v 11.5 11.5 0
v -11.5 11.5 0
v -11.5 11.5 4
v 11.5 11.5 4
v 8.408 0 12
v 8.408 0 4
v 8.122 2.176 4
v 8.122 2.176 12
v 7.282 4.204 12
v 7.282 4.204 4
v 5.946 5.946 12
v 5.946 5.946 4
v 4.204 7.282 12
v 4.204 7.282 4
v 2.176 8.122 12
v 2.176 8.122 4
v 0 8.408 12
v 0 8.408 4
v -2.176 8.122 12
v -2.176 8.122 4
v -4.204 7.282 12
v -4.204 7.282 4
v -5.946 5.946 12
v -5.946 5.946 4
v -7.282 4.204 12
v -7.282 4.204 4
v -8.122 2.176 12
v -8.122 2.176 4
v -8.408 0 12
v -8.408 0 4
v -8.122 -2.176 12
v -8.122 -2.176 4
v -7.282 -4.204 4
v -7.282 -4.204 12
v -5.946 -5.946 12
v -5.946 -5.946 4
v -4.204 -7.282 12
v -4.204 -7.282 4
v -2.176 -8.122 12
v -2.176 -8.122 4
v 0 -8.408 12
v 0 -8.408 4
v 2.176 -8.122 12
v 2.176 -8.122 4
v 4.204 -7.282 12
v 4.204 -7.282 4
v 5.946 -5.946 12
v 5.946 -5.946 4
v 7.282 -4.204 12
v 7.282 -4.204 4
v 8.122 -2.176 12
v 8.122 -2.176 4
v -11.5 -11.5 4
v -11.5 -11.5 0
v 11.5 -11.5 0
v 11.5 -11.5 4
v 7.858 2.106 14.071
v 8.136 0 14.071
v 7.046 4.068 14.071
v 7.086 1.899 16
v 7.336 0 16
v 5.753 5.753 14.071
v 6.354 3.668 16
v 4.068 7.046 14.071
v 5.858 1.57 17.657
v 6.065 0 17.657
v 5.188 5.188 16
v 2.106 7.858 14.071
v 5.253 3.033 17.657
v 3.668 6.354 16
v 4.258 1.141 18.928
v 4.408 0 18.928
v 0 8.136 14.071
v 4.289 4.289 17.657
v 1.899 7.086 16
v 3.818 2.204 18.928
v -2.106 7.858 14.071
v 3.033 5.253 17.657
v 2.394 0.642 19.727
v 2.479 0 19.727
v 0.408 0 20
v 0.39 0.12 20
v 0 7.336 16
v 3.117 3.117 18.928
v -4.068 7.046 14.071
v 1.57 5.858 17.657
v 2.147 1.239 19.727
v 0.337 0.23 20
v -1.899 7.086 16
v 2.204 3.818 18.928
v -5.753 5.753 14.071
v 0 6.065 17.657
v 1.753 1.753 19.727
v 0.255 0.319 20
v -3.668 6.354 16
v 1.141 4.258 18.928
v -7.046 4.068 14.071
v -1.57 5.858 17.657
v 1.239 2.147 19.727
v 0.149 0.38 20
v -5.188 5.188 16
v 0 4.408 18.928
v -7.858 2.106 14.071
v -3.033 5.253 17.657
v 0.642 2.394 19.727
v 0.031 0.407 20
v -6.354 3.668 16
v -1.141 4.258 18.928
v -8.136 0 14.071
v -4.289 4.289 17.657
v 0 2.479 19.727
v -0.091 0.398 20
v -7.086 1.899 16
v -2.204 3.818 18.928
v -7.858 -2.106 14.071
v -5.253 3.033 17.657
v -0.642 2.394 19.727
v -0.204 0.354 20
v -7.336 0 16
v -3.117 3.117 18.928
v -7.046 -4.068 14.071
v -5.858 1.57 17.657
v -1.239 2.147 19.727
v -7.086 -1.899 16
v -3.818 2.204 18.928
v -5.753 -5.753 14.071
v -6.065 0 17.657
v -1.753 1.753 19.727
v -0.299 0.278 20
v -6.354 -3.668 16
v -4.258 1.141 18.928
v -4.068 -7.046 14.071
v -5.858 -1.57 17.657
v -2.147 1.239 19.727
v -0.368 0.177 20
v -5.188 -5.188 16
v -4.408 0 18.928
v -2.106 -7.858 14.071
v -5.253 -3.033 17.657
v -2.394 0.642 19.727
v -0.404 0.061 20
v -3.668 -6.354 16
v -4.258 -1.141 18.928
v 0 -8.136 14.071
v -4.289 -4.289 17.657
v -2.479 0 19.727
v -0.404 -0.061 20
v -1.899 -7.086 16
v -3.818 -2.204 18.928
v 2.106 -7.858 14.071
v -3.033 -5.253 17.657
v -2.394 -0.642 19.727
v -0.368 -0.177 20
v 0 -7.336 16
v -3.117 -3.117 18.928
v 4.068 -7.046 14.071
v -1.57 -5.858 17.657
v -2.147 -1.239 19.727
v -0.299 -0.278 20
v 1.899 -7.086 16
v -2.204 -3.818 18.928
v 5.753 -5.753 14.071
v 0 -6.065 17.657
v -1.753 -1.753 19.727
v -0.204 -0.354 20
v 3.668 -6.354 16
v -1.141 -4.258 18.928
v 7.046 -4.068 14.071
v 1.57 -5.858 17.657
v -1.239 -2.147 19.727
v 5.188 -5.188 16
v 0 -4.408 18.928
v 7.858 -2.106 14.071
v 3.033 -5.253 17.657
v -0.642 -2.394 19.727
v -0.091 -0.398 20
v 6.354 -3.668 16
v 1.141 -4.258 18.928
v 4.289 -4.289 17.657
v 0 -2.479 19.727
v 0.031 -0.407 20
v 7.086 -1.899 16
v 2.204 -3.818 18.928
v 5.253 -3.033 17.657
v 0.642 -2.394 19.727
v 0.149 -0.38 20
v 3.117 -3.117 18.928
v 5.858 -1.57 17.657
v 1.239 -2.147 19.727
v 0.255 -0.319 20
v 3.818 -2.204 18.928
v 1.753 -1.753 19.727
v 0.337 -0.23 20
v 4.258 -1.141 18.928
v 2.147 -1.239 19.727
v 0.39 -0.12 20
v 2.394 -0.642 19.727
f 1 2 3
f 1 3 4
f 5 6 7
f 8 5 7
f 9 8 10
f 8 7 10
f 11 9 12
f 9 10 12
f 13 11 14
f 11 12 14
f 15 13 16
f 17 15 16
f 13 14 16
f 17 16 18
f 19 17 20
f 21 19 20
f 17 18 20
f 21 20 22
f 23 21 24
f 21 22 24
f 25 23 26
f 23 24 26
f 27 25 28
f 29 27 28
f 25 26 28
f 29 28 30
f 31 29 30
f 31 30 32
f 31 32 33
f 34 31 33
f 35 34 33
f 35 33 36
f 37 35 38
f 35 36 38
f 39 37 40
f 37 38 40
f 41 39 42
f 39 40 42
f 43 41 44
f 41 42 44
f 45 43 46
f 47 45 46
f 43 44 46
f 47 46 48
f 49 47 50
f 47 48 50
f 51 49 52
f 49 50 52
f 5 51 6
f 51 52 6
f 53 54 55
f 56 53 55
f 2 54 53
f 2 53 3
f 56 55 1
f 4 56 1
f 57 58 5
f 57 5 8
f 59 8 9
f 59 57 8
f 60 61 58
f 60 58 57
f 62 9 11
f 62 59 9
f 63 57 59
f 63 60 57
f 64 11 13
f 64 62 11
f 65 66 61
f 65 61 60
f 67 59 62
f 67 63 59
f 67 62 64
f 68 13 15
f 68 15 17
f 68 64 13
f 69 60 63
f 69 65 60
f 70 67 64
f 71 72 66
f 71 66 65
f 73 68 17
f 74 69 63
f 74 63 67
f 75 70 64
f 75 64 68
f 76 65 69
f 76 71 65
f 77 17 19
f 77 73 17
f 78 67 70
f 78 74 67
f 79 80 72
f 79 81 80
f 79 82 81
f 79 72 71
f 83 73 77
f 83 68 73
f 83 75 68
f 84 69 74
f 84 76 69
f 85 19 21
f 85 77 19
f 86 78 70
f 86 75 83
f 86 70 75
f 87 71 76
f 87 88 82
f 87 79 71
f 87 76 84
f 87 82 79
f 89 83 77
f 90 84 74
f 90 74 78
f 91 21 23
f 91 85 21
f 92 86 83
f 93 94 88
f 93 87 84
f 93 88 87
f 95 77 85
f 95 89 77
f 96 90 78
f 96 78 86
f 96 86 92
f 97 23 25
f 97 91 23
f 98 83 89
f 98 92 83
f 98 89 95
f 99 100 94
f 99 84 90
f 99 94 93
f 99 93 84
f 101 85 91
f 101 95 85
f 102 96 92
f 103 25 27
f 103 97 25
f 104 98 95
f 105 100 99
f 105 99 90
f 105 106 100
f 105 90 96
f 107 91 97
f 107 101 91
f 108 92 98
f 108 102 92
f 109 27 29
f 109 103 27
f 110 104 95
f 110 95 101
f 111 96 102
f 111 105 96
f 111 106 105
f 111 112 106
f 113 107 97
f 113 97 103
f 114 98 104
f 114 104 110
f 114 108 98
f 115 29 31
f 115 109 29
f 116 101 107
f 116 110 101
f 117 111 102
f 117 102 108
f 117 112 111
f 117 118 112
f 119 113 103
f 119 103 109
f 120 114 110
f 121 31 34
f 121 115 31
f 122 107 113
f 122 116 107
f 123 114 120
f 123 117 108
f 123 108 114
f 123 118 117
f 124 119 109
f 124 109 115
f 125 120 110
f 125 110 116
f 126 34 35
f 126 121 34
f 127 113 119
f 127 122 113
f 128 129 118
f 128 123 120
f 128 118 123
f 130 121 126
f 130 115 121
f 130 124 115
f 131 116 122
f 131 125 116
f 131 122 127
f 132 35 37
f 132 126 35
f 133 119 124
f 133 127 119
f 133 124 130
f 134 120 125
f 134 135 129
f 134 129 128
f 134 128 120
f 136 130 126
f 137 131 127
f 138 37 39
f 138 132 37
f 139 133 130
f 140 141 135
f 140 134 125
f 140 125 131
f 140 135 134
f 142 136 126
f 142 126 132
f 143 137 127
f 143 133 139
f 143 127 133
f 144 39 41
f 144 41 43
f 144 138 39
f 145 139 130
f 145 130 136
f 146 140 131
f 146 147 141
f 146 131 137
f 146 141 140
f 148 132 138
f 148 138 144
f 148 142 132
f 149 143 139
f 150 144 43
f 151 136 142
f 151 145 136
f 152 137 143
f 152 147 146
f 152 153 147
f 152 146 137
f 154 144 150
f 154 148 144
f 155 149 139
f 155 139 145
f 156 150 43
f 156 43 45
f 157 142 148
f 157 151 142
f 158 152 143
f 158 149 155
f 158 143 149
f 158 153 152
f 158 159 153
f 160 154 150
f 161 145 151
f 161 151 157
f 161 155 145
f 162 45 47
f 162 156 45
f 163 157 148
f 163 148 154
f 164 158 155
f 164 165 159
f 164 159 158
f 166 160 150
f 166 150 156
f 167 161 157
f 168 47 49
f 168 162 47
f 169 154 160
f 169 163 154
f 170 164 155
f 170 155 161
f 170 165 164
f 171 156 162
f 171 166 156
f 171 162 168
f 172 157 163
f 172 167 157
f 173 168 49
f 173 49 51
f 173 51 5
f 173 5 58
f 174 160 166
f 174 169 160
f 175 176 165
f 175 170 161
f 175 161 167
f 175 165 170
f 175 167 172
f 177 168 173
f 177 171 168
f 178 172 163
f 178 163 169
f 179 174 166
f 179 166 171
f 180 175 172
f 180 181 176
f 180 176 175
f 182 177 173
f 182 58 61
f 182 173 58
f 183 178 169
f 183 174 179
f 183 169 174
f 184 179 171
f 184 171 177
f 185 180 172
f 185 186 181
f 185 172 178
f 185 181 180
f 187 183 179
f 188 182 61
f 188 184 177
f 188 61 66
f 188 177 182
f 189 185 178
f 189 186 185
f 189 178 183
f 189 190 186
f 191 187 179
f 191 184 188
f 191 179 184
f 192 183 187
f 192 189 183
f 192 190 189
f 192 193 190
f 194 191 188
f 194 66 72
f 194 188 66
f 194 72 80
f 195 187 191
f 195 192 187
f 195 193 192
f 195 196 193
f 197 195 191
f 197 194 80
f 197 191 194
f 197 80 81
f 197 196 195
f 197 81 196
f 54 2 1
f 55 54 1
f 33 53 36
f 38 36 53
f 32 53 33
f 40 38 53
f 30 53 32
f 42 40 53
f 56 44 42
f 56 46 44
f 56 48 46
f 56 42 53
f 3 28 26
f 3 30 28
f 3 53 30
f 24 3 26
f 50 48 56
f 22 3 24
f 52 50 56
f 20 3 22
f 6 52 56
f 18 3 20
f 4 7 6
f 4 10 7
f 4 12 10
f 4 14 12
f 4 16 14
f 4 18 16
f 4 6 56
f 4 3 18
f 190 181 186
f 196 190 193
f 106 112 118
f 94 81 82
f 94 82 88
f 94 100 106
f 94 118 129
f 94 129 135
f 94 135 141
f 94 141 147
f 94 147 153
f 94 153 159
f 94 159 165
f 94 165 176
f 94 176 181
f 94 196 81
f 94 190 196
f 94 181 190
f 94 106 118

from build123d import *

# Parameters (mm, degrees)
F0_W     = 23
F0_H     = 23
F1_DEPTH = 4
F2_R     = 8.408234
F3_DEPTH = 16
F4_R     = 8


with BuildPart() as f1:
    # F0 (on Top) → F1 (new body)
    with BuildSketch(Plane.XY):
        Rectangle(F0_W, F0_H)
    extrude(amount=F1_DEPTH)

    # F2 (on face) → F3 (join)
    with BuildSketch(Plane.XY.offset(4)):
        Circle(F2_R)
    extrude(amount=F3_DEPTH)

    # F4
    f4_edges = [f1.edges().sort_by_distance(p)[0] for p in [
        (-8.408234, 0, 20),
    ]]
    fillet(f4_edges, radius=F4_R)


solid = f1.part
